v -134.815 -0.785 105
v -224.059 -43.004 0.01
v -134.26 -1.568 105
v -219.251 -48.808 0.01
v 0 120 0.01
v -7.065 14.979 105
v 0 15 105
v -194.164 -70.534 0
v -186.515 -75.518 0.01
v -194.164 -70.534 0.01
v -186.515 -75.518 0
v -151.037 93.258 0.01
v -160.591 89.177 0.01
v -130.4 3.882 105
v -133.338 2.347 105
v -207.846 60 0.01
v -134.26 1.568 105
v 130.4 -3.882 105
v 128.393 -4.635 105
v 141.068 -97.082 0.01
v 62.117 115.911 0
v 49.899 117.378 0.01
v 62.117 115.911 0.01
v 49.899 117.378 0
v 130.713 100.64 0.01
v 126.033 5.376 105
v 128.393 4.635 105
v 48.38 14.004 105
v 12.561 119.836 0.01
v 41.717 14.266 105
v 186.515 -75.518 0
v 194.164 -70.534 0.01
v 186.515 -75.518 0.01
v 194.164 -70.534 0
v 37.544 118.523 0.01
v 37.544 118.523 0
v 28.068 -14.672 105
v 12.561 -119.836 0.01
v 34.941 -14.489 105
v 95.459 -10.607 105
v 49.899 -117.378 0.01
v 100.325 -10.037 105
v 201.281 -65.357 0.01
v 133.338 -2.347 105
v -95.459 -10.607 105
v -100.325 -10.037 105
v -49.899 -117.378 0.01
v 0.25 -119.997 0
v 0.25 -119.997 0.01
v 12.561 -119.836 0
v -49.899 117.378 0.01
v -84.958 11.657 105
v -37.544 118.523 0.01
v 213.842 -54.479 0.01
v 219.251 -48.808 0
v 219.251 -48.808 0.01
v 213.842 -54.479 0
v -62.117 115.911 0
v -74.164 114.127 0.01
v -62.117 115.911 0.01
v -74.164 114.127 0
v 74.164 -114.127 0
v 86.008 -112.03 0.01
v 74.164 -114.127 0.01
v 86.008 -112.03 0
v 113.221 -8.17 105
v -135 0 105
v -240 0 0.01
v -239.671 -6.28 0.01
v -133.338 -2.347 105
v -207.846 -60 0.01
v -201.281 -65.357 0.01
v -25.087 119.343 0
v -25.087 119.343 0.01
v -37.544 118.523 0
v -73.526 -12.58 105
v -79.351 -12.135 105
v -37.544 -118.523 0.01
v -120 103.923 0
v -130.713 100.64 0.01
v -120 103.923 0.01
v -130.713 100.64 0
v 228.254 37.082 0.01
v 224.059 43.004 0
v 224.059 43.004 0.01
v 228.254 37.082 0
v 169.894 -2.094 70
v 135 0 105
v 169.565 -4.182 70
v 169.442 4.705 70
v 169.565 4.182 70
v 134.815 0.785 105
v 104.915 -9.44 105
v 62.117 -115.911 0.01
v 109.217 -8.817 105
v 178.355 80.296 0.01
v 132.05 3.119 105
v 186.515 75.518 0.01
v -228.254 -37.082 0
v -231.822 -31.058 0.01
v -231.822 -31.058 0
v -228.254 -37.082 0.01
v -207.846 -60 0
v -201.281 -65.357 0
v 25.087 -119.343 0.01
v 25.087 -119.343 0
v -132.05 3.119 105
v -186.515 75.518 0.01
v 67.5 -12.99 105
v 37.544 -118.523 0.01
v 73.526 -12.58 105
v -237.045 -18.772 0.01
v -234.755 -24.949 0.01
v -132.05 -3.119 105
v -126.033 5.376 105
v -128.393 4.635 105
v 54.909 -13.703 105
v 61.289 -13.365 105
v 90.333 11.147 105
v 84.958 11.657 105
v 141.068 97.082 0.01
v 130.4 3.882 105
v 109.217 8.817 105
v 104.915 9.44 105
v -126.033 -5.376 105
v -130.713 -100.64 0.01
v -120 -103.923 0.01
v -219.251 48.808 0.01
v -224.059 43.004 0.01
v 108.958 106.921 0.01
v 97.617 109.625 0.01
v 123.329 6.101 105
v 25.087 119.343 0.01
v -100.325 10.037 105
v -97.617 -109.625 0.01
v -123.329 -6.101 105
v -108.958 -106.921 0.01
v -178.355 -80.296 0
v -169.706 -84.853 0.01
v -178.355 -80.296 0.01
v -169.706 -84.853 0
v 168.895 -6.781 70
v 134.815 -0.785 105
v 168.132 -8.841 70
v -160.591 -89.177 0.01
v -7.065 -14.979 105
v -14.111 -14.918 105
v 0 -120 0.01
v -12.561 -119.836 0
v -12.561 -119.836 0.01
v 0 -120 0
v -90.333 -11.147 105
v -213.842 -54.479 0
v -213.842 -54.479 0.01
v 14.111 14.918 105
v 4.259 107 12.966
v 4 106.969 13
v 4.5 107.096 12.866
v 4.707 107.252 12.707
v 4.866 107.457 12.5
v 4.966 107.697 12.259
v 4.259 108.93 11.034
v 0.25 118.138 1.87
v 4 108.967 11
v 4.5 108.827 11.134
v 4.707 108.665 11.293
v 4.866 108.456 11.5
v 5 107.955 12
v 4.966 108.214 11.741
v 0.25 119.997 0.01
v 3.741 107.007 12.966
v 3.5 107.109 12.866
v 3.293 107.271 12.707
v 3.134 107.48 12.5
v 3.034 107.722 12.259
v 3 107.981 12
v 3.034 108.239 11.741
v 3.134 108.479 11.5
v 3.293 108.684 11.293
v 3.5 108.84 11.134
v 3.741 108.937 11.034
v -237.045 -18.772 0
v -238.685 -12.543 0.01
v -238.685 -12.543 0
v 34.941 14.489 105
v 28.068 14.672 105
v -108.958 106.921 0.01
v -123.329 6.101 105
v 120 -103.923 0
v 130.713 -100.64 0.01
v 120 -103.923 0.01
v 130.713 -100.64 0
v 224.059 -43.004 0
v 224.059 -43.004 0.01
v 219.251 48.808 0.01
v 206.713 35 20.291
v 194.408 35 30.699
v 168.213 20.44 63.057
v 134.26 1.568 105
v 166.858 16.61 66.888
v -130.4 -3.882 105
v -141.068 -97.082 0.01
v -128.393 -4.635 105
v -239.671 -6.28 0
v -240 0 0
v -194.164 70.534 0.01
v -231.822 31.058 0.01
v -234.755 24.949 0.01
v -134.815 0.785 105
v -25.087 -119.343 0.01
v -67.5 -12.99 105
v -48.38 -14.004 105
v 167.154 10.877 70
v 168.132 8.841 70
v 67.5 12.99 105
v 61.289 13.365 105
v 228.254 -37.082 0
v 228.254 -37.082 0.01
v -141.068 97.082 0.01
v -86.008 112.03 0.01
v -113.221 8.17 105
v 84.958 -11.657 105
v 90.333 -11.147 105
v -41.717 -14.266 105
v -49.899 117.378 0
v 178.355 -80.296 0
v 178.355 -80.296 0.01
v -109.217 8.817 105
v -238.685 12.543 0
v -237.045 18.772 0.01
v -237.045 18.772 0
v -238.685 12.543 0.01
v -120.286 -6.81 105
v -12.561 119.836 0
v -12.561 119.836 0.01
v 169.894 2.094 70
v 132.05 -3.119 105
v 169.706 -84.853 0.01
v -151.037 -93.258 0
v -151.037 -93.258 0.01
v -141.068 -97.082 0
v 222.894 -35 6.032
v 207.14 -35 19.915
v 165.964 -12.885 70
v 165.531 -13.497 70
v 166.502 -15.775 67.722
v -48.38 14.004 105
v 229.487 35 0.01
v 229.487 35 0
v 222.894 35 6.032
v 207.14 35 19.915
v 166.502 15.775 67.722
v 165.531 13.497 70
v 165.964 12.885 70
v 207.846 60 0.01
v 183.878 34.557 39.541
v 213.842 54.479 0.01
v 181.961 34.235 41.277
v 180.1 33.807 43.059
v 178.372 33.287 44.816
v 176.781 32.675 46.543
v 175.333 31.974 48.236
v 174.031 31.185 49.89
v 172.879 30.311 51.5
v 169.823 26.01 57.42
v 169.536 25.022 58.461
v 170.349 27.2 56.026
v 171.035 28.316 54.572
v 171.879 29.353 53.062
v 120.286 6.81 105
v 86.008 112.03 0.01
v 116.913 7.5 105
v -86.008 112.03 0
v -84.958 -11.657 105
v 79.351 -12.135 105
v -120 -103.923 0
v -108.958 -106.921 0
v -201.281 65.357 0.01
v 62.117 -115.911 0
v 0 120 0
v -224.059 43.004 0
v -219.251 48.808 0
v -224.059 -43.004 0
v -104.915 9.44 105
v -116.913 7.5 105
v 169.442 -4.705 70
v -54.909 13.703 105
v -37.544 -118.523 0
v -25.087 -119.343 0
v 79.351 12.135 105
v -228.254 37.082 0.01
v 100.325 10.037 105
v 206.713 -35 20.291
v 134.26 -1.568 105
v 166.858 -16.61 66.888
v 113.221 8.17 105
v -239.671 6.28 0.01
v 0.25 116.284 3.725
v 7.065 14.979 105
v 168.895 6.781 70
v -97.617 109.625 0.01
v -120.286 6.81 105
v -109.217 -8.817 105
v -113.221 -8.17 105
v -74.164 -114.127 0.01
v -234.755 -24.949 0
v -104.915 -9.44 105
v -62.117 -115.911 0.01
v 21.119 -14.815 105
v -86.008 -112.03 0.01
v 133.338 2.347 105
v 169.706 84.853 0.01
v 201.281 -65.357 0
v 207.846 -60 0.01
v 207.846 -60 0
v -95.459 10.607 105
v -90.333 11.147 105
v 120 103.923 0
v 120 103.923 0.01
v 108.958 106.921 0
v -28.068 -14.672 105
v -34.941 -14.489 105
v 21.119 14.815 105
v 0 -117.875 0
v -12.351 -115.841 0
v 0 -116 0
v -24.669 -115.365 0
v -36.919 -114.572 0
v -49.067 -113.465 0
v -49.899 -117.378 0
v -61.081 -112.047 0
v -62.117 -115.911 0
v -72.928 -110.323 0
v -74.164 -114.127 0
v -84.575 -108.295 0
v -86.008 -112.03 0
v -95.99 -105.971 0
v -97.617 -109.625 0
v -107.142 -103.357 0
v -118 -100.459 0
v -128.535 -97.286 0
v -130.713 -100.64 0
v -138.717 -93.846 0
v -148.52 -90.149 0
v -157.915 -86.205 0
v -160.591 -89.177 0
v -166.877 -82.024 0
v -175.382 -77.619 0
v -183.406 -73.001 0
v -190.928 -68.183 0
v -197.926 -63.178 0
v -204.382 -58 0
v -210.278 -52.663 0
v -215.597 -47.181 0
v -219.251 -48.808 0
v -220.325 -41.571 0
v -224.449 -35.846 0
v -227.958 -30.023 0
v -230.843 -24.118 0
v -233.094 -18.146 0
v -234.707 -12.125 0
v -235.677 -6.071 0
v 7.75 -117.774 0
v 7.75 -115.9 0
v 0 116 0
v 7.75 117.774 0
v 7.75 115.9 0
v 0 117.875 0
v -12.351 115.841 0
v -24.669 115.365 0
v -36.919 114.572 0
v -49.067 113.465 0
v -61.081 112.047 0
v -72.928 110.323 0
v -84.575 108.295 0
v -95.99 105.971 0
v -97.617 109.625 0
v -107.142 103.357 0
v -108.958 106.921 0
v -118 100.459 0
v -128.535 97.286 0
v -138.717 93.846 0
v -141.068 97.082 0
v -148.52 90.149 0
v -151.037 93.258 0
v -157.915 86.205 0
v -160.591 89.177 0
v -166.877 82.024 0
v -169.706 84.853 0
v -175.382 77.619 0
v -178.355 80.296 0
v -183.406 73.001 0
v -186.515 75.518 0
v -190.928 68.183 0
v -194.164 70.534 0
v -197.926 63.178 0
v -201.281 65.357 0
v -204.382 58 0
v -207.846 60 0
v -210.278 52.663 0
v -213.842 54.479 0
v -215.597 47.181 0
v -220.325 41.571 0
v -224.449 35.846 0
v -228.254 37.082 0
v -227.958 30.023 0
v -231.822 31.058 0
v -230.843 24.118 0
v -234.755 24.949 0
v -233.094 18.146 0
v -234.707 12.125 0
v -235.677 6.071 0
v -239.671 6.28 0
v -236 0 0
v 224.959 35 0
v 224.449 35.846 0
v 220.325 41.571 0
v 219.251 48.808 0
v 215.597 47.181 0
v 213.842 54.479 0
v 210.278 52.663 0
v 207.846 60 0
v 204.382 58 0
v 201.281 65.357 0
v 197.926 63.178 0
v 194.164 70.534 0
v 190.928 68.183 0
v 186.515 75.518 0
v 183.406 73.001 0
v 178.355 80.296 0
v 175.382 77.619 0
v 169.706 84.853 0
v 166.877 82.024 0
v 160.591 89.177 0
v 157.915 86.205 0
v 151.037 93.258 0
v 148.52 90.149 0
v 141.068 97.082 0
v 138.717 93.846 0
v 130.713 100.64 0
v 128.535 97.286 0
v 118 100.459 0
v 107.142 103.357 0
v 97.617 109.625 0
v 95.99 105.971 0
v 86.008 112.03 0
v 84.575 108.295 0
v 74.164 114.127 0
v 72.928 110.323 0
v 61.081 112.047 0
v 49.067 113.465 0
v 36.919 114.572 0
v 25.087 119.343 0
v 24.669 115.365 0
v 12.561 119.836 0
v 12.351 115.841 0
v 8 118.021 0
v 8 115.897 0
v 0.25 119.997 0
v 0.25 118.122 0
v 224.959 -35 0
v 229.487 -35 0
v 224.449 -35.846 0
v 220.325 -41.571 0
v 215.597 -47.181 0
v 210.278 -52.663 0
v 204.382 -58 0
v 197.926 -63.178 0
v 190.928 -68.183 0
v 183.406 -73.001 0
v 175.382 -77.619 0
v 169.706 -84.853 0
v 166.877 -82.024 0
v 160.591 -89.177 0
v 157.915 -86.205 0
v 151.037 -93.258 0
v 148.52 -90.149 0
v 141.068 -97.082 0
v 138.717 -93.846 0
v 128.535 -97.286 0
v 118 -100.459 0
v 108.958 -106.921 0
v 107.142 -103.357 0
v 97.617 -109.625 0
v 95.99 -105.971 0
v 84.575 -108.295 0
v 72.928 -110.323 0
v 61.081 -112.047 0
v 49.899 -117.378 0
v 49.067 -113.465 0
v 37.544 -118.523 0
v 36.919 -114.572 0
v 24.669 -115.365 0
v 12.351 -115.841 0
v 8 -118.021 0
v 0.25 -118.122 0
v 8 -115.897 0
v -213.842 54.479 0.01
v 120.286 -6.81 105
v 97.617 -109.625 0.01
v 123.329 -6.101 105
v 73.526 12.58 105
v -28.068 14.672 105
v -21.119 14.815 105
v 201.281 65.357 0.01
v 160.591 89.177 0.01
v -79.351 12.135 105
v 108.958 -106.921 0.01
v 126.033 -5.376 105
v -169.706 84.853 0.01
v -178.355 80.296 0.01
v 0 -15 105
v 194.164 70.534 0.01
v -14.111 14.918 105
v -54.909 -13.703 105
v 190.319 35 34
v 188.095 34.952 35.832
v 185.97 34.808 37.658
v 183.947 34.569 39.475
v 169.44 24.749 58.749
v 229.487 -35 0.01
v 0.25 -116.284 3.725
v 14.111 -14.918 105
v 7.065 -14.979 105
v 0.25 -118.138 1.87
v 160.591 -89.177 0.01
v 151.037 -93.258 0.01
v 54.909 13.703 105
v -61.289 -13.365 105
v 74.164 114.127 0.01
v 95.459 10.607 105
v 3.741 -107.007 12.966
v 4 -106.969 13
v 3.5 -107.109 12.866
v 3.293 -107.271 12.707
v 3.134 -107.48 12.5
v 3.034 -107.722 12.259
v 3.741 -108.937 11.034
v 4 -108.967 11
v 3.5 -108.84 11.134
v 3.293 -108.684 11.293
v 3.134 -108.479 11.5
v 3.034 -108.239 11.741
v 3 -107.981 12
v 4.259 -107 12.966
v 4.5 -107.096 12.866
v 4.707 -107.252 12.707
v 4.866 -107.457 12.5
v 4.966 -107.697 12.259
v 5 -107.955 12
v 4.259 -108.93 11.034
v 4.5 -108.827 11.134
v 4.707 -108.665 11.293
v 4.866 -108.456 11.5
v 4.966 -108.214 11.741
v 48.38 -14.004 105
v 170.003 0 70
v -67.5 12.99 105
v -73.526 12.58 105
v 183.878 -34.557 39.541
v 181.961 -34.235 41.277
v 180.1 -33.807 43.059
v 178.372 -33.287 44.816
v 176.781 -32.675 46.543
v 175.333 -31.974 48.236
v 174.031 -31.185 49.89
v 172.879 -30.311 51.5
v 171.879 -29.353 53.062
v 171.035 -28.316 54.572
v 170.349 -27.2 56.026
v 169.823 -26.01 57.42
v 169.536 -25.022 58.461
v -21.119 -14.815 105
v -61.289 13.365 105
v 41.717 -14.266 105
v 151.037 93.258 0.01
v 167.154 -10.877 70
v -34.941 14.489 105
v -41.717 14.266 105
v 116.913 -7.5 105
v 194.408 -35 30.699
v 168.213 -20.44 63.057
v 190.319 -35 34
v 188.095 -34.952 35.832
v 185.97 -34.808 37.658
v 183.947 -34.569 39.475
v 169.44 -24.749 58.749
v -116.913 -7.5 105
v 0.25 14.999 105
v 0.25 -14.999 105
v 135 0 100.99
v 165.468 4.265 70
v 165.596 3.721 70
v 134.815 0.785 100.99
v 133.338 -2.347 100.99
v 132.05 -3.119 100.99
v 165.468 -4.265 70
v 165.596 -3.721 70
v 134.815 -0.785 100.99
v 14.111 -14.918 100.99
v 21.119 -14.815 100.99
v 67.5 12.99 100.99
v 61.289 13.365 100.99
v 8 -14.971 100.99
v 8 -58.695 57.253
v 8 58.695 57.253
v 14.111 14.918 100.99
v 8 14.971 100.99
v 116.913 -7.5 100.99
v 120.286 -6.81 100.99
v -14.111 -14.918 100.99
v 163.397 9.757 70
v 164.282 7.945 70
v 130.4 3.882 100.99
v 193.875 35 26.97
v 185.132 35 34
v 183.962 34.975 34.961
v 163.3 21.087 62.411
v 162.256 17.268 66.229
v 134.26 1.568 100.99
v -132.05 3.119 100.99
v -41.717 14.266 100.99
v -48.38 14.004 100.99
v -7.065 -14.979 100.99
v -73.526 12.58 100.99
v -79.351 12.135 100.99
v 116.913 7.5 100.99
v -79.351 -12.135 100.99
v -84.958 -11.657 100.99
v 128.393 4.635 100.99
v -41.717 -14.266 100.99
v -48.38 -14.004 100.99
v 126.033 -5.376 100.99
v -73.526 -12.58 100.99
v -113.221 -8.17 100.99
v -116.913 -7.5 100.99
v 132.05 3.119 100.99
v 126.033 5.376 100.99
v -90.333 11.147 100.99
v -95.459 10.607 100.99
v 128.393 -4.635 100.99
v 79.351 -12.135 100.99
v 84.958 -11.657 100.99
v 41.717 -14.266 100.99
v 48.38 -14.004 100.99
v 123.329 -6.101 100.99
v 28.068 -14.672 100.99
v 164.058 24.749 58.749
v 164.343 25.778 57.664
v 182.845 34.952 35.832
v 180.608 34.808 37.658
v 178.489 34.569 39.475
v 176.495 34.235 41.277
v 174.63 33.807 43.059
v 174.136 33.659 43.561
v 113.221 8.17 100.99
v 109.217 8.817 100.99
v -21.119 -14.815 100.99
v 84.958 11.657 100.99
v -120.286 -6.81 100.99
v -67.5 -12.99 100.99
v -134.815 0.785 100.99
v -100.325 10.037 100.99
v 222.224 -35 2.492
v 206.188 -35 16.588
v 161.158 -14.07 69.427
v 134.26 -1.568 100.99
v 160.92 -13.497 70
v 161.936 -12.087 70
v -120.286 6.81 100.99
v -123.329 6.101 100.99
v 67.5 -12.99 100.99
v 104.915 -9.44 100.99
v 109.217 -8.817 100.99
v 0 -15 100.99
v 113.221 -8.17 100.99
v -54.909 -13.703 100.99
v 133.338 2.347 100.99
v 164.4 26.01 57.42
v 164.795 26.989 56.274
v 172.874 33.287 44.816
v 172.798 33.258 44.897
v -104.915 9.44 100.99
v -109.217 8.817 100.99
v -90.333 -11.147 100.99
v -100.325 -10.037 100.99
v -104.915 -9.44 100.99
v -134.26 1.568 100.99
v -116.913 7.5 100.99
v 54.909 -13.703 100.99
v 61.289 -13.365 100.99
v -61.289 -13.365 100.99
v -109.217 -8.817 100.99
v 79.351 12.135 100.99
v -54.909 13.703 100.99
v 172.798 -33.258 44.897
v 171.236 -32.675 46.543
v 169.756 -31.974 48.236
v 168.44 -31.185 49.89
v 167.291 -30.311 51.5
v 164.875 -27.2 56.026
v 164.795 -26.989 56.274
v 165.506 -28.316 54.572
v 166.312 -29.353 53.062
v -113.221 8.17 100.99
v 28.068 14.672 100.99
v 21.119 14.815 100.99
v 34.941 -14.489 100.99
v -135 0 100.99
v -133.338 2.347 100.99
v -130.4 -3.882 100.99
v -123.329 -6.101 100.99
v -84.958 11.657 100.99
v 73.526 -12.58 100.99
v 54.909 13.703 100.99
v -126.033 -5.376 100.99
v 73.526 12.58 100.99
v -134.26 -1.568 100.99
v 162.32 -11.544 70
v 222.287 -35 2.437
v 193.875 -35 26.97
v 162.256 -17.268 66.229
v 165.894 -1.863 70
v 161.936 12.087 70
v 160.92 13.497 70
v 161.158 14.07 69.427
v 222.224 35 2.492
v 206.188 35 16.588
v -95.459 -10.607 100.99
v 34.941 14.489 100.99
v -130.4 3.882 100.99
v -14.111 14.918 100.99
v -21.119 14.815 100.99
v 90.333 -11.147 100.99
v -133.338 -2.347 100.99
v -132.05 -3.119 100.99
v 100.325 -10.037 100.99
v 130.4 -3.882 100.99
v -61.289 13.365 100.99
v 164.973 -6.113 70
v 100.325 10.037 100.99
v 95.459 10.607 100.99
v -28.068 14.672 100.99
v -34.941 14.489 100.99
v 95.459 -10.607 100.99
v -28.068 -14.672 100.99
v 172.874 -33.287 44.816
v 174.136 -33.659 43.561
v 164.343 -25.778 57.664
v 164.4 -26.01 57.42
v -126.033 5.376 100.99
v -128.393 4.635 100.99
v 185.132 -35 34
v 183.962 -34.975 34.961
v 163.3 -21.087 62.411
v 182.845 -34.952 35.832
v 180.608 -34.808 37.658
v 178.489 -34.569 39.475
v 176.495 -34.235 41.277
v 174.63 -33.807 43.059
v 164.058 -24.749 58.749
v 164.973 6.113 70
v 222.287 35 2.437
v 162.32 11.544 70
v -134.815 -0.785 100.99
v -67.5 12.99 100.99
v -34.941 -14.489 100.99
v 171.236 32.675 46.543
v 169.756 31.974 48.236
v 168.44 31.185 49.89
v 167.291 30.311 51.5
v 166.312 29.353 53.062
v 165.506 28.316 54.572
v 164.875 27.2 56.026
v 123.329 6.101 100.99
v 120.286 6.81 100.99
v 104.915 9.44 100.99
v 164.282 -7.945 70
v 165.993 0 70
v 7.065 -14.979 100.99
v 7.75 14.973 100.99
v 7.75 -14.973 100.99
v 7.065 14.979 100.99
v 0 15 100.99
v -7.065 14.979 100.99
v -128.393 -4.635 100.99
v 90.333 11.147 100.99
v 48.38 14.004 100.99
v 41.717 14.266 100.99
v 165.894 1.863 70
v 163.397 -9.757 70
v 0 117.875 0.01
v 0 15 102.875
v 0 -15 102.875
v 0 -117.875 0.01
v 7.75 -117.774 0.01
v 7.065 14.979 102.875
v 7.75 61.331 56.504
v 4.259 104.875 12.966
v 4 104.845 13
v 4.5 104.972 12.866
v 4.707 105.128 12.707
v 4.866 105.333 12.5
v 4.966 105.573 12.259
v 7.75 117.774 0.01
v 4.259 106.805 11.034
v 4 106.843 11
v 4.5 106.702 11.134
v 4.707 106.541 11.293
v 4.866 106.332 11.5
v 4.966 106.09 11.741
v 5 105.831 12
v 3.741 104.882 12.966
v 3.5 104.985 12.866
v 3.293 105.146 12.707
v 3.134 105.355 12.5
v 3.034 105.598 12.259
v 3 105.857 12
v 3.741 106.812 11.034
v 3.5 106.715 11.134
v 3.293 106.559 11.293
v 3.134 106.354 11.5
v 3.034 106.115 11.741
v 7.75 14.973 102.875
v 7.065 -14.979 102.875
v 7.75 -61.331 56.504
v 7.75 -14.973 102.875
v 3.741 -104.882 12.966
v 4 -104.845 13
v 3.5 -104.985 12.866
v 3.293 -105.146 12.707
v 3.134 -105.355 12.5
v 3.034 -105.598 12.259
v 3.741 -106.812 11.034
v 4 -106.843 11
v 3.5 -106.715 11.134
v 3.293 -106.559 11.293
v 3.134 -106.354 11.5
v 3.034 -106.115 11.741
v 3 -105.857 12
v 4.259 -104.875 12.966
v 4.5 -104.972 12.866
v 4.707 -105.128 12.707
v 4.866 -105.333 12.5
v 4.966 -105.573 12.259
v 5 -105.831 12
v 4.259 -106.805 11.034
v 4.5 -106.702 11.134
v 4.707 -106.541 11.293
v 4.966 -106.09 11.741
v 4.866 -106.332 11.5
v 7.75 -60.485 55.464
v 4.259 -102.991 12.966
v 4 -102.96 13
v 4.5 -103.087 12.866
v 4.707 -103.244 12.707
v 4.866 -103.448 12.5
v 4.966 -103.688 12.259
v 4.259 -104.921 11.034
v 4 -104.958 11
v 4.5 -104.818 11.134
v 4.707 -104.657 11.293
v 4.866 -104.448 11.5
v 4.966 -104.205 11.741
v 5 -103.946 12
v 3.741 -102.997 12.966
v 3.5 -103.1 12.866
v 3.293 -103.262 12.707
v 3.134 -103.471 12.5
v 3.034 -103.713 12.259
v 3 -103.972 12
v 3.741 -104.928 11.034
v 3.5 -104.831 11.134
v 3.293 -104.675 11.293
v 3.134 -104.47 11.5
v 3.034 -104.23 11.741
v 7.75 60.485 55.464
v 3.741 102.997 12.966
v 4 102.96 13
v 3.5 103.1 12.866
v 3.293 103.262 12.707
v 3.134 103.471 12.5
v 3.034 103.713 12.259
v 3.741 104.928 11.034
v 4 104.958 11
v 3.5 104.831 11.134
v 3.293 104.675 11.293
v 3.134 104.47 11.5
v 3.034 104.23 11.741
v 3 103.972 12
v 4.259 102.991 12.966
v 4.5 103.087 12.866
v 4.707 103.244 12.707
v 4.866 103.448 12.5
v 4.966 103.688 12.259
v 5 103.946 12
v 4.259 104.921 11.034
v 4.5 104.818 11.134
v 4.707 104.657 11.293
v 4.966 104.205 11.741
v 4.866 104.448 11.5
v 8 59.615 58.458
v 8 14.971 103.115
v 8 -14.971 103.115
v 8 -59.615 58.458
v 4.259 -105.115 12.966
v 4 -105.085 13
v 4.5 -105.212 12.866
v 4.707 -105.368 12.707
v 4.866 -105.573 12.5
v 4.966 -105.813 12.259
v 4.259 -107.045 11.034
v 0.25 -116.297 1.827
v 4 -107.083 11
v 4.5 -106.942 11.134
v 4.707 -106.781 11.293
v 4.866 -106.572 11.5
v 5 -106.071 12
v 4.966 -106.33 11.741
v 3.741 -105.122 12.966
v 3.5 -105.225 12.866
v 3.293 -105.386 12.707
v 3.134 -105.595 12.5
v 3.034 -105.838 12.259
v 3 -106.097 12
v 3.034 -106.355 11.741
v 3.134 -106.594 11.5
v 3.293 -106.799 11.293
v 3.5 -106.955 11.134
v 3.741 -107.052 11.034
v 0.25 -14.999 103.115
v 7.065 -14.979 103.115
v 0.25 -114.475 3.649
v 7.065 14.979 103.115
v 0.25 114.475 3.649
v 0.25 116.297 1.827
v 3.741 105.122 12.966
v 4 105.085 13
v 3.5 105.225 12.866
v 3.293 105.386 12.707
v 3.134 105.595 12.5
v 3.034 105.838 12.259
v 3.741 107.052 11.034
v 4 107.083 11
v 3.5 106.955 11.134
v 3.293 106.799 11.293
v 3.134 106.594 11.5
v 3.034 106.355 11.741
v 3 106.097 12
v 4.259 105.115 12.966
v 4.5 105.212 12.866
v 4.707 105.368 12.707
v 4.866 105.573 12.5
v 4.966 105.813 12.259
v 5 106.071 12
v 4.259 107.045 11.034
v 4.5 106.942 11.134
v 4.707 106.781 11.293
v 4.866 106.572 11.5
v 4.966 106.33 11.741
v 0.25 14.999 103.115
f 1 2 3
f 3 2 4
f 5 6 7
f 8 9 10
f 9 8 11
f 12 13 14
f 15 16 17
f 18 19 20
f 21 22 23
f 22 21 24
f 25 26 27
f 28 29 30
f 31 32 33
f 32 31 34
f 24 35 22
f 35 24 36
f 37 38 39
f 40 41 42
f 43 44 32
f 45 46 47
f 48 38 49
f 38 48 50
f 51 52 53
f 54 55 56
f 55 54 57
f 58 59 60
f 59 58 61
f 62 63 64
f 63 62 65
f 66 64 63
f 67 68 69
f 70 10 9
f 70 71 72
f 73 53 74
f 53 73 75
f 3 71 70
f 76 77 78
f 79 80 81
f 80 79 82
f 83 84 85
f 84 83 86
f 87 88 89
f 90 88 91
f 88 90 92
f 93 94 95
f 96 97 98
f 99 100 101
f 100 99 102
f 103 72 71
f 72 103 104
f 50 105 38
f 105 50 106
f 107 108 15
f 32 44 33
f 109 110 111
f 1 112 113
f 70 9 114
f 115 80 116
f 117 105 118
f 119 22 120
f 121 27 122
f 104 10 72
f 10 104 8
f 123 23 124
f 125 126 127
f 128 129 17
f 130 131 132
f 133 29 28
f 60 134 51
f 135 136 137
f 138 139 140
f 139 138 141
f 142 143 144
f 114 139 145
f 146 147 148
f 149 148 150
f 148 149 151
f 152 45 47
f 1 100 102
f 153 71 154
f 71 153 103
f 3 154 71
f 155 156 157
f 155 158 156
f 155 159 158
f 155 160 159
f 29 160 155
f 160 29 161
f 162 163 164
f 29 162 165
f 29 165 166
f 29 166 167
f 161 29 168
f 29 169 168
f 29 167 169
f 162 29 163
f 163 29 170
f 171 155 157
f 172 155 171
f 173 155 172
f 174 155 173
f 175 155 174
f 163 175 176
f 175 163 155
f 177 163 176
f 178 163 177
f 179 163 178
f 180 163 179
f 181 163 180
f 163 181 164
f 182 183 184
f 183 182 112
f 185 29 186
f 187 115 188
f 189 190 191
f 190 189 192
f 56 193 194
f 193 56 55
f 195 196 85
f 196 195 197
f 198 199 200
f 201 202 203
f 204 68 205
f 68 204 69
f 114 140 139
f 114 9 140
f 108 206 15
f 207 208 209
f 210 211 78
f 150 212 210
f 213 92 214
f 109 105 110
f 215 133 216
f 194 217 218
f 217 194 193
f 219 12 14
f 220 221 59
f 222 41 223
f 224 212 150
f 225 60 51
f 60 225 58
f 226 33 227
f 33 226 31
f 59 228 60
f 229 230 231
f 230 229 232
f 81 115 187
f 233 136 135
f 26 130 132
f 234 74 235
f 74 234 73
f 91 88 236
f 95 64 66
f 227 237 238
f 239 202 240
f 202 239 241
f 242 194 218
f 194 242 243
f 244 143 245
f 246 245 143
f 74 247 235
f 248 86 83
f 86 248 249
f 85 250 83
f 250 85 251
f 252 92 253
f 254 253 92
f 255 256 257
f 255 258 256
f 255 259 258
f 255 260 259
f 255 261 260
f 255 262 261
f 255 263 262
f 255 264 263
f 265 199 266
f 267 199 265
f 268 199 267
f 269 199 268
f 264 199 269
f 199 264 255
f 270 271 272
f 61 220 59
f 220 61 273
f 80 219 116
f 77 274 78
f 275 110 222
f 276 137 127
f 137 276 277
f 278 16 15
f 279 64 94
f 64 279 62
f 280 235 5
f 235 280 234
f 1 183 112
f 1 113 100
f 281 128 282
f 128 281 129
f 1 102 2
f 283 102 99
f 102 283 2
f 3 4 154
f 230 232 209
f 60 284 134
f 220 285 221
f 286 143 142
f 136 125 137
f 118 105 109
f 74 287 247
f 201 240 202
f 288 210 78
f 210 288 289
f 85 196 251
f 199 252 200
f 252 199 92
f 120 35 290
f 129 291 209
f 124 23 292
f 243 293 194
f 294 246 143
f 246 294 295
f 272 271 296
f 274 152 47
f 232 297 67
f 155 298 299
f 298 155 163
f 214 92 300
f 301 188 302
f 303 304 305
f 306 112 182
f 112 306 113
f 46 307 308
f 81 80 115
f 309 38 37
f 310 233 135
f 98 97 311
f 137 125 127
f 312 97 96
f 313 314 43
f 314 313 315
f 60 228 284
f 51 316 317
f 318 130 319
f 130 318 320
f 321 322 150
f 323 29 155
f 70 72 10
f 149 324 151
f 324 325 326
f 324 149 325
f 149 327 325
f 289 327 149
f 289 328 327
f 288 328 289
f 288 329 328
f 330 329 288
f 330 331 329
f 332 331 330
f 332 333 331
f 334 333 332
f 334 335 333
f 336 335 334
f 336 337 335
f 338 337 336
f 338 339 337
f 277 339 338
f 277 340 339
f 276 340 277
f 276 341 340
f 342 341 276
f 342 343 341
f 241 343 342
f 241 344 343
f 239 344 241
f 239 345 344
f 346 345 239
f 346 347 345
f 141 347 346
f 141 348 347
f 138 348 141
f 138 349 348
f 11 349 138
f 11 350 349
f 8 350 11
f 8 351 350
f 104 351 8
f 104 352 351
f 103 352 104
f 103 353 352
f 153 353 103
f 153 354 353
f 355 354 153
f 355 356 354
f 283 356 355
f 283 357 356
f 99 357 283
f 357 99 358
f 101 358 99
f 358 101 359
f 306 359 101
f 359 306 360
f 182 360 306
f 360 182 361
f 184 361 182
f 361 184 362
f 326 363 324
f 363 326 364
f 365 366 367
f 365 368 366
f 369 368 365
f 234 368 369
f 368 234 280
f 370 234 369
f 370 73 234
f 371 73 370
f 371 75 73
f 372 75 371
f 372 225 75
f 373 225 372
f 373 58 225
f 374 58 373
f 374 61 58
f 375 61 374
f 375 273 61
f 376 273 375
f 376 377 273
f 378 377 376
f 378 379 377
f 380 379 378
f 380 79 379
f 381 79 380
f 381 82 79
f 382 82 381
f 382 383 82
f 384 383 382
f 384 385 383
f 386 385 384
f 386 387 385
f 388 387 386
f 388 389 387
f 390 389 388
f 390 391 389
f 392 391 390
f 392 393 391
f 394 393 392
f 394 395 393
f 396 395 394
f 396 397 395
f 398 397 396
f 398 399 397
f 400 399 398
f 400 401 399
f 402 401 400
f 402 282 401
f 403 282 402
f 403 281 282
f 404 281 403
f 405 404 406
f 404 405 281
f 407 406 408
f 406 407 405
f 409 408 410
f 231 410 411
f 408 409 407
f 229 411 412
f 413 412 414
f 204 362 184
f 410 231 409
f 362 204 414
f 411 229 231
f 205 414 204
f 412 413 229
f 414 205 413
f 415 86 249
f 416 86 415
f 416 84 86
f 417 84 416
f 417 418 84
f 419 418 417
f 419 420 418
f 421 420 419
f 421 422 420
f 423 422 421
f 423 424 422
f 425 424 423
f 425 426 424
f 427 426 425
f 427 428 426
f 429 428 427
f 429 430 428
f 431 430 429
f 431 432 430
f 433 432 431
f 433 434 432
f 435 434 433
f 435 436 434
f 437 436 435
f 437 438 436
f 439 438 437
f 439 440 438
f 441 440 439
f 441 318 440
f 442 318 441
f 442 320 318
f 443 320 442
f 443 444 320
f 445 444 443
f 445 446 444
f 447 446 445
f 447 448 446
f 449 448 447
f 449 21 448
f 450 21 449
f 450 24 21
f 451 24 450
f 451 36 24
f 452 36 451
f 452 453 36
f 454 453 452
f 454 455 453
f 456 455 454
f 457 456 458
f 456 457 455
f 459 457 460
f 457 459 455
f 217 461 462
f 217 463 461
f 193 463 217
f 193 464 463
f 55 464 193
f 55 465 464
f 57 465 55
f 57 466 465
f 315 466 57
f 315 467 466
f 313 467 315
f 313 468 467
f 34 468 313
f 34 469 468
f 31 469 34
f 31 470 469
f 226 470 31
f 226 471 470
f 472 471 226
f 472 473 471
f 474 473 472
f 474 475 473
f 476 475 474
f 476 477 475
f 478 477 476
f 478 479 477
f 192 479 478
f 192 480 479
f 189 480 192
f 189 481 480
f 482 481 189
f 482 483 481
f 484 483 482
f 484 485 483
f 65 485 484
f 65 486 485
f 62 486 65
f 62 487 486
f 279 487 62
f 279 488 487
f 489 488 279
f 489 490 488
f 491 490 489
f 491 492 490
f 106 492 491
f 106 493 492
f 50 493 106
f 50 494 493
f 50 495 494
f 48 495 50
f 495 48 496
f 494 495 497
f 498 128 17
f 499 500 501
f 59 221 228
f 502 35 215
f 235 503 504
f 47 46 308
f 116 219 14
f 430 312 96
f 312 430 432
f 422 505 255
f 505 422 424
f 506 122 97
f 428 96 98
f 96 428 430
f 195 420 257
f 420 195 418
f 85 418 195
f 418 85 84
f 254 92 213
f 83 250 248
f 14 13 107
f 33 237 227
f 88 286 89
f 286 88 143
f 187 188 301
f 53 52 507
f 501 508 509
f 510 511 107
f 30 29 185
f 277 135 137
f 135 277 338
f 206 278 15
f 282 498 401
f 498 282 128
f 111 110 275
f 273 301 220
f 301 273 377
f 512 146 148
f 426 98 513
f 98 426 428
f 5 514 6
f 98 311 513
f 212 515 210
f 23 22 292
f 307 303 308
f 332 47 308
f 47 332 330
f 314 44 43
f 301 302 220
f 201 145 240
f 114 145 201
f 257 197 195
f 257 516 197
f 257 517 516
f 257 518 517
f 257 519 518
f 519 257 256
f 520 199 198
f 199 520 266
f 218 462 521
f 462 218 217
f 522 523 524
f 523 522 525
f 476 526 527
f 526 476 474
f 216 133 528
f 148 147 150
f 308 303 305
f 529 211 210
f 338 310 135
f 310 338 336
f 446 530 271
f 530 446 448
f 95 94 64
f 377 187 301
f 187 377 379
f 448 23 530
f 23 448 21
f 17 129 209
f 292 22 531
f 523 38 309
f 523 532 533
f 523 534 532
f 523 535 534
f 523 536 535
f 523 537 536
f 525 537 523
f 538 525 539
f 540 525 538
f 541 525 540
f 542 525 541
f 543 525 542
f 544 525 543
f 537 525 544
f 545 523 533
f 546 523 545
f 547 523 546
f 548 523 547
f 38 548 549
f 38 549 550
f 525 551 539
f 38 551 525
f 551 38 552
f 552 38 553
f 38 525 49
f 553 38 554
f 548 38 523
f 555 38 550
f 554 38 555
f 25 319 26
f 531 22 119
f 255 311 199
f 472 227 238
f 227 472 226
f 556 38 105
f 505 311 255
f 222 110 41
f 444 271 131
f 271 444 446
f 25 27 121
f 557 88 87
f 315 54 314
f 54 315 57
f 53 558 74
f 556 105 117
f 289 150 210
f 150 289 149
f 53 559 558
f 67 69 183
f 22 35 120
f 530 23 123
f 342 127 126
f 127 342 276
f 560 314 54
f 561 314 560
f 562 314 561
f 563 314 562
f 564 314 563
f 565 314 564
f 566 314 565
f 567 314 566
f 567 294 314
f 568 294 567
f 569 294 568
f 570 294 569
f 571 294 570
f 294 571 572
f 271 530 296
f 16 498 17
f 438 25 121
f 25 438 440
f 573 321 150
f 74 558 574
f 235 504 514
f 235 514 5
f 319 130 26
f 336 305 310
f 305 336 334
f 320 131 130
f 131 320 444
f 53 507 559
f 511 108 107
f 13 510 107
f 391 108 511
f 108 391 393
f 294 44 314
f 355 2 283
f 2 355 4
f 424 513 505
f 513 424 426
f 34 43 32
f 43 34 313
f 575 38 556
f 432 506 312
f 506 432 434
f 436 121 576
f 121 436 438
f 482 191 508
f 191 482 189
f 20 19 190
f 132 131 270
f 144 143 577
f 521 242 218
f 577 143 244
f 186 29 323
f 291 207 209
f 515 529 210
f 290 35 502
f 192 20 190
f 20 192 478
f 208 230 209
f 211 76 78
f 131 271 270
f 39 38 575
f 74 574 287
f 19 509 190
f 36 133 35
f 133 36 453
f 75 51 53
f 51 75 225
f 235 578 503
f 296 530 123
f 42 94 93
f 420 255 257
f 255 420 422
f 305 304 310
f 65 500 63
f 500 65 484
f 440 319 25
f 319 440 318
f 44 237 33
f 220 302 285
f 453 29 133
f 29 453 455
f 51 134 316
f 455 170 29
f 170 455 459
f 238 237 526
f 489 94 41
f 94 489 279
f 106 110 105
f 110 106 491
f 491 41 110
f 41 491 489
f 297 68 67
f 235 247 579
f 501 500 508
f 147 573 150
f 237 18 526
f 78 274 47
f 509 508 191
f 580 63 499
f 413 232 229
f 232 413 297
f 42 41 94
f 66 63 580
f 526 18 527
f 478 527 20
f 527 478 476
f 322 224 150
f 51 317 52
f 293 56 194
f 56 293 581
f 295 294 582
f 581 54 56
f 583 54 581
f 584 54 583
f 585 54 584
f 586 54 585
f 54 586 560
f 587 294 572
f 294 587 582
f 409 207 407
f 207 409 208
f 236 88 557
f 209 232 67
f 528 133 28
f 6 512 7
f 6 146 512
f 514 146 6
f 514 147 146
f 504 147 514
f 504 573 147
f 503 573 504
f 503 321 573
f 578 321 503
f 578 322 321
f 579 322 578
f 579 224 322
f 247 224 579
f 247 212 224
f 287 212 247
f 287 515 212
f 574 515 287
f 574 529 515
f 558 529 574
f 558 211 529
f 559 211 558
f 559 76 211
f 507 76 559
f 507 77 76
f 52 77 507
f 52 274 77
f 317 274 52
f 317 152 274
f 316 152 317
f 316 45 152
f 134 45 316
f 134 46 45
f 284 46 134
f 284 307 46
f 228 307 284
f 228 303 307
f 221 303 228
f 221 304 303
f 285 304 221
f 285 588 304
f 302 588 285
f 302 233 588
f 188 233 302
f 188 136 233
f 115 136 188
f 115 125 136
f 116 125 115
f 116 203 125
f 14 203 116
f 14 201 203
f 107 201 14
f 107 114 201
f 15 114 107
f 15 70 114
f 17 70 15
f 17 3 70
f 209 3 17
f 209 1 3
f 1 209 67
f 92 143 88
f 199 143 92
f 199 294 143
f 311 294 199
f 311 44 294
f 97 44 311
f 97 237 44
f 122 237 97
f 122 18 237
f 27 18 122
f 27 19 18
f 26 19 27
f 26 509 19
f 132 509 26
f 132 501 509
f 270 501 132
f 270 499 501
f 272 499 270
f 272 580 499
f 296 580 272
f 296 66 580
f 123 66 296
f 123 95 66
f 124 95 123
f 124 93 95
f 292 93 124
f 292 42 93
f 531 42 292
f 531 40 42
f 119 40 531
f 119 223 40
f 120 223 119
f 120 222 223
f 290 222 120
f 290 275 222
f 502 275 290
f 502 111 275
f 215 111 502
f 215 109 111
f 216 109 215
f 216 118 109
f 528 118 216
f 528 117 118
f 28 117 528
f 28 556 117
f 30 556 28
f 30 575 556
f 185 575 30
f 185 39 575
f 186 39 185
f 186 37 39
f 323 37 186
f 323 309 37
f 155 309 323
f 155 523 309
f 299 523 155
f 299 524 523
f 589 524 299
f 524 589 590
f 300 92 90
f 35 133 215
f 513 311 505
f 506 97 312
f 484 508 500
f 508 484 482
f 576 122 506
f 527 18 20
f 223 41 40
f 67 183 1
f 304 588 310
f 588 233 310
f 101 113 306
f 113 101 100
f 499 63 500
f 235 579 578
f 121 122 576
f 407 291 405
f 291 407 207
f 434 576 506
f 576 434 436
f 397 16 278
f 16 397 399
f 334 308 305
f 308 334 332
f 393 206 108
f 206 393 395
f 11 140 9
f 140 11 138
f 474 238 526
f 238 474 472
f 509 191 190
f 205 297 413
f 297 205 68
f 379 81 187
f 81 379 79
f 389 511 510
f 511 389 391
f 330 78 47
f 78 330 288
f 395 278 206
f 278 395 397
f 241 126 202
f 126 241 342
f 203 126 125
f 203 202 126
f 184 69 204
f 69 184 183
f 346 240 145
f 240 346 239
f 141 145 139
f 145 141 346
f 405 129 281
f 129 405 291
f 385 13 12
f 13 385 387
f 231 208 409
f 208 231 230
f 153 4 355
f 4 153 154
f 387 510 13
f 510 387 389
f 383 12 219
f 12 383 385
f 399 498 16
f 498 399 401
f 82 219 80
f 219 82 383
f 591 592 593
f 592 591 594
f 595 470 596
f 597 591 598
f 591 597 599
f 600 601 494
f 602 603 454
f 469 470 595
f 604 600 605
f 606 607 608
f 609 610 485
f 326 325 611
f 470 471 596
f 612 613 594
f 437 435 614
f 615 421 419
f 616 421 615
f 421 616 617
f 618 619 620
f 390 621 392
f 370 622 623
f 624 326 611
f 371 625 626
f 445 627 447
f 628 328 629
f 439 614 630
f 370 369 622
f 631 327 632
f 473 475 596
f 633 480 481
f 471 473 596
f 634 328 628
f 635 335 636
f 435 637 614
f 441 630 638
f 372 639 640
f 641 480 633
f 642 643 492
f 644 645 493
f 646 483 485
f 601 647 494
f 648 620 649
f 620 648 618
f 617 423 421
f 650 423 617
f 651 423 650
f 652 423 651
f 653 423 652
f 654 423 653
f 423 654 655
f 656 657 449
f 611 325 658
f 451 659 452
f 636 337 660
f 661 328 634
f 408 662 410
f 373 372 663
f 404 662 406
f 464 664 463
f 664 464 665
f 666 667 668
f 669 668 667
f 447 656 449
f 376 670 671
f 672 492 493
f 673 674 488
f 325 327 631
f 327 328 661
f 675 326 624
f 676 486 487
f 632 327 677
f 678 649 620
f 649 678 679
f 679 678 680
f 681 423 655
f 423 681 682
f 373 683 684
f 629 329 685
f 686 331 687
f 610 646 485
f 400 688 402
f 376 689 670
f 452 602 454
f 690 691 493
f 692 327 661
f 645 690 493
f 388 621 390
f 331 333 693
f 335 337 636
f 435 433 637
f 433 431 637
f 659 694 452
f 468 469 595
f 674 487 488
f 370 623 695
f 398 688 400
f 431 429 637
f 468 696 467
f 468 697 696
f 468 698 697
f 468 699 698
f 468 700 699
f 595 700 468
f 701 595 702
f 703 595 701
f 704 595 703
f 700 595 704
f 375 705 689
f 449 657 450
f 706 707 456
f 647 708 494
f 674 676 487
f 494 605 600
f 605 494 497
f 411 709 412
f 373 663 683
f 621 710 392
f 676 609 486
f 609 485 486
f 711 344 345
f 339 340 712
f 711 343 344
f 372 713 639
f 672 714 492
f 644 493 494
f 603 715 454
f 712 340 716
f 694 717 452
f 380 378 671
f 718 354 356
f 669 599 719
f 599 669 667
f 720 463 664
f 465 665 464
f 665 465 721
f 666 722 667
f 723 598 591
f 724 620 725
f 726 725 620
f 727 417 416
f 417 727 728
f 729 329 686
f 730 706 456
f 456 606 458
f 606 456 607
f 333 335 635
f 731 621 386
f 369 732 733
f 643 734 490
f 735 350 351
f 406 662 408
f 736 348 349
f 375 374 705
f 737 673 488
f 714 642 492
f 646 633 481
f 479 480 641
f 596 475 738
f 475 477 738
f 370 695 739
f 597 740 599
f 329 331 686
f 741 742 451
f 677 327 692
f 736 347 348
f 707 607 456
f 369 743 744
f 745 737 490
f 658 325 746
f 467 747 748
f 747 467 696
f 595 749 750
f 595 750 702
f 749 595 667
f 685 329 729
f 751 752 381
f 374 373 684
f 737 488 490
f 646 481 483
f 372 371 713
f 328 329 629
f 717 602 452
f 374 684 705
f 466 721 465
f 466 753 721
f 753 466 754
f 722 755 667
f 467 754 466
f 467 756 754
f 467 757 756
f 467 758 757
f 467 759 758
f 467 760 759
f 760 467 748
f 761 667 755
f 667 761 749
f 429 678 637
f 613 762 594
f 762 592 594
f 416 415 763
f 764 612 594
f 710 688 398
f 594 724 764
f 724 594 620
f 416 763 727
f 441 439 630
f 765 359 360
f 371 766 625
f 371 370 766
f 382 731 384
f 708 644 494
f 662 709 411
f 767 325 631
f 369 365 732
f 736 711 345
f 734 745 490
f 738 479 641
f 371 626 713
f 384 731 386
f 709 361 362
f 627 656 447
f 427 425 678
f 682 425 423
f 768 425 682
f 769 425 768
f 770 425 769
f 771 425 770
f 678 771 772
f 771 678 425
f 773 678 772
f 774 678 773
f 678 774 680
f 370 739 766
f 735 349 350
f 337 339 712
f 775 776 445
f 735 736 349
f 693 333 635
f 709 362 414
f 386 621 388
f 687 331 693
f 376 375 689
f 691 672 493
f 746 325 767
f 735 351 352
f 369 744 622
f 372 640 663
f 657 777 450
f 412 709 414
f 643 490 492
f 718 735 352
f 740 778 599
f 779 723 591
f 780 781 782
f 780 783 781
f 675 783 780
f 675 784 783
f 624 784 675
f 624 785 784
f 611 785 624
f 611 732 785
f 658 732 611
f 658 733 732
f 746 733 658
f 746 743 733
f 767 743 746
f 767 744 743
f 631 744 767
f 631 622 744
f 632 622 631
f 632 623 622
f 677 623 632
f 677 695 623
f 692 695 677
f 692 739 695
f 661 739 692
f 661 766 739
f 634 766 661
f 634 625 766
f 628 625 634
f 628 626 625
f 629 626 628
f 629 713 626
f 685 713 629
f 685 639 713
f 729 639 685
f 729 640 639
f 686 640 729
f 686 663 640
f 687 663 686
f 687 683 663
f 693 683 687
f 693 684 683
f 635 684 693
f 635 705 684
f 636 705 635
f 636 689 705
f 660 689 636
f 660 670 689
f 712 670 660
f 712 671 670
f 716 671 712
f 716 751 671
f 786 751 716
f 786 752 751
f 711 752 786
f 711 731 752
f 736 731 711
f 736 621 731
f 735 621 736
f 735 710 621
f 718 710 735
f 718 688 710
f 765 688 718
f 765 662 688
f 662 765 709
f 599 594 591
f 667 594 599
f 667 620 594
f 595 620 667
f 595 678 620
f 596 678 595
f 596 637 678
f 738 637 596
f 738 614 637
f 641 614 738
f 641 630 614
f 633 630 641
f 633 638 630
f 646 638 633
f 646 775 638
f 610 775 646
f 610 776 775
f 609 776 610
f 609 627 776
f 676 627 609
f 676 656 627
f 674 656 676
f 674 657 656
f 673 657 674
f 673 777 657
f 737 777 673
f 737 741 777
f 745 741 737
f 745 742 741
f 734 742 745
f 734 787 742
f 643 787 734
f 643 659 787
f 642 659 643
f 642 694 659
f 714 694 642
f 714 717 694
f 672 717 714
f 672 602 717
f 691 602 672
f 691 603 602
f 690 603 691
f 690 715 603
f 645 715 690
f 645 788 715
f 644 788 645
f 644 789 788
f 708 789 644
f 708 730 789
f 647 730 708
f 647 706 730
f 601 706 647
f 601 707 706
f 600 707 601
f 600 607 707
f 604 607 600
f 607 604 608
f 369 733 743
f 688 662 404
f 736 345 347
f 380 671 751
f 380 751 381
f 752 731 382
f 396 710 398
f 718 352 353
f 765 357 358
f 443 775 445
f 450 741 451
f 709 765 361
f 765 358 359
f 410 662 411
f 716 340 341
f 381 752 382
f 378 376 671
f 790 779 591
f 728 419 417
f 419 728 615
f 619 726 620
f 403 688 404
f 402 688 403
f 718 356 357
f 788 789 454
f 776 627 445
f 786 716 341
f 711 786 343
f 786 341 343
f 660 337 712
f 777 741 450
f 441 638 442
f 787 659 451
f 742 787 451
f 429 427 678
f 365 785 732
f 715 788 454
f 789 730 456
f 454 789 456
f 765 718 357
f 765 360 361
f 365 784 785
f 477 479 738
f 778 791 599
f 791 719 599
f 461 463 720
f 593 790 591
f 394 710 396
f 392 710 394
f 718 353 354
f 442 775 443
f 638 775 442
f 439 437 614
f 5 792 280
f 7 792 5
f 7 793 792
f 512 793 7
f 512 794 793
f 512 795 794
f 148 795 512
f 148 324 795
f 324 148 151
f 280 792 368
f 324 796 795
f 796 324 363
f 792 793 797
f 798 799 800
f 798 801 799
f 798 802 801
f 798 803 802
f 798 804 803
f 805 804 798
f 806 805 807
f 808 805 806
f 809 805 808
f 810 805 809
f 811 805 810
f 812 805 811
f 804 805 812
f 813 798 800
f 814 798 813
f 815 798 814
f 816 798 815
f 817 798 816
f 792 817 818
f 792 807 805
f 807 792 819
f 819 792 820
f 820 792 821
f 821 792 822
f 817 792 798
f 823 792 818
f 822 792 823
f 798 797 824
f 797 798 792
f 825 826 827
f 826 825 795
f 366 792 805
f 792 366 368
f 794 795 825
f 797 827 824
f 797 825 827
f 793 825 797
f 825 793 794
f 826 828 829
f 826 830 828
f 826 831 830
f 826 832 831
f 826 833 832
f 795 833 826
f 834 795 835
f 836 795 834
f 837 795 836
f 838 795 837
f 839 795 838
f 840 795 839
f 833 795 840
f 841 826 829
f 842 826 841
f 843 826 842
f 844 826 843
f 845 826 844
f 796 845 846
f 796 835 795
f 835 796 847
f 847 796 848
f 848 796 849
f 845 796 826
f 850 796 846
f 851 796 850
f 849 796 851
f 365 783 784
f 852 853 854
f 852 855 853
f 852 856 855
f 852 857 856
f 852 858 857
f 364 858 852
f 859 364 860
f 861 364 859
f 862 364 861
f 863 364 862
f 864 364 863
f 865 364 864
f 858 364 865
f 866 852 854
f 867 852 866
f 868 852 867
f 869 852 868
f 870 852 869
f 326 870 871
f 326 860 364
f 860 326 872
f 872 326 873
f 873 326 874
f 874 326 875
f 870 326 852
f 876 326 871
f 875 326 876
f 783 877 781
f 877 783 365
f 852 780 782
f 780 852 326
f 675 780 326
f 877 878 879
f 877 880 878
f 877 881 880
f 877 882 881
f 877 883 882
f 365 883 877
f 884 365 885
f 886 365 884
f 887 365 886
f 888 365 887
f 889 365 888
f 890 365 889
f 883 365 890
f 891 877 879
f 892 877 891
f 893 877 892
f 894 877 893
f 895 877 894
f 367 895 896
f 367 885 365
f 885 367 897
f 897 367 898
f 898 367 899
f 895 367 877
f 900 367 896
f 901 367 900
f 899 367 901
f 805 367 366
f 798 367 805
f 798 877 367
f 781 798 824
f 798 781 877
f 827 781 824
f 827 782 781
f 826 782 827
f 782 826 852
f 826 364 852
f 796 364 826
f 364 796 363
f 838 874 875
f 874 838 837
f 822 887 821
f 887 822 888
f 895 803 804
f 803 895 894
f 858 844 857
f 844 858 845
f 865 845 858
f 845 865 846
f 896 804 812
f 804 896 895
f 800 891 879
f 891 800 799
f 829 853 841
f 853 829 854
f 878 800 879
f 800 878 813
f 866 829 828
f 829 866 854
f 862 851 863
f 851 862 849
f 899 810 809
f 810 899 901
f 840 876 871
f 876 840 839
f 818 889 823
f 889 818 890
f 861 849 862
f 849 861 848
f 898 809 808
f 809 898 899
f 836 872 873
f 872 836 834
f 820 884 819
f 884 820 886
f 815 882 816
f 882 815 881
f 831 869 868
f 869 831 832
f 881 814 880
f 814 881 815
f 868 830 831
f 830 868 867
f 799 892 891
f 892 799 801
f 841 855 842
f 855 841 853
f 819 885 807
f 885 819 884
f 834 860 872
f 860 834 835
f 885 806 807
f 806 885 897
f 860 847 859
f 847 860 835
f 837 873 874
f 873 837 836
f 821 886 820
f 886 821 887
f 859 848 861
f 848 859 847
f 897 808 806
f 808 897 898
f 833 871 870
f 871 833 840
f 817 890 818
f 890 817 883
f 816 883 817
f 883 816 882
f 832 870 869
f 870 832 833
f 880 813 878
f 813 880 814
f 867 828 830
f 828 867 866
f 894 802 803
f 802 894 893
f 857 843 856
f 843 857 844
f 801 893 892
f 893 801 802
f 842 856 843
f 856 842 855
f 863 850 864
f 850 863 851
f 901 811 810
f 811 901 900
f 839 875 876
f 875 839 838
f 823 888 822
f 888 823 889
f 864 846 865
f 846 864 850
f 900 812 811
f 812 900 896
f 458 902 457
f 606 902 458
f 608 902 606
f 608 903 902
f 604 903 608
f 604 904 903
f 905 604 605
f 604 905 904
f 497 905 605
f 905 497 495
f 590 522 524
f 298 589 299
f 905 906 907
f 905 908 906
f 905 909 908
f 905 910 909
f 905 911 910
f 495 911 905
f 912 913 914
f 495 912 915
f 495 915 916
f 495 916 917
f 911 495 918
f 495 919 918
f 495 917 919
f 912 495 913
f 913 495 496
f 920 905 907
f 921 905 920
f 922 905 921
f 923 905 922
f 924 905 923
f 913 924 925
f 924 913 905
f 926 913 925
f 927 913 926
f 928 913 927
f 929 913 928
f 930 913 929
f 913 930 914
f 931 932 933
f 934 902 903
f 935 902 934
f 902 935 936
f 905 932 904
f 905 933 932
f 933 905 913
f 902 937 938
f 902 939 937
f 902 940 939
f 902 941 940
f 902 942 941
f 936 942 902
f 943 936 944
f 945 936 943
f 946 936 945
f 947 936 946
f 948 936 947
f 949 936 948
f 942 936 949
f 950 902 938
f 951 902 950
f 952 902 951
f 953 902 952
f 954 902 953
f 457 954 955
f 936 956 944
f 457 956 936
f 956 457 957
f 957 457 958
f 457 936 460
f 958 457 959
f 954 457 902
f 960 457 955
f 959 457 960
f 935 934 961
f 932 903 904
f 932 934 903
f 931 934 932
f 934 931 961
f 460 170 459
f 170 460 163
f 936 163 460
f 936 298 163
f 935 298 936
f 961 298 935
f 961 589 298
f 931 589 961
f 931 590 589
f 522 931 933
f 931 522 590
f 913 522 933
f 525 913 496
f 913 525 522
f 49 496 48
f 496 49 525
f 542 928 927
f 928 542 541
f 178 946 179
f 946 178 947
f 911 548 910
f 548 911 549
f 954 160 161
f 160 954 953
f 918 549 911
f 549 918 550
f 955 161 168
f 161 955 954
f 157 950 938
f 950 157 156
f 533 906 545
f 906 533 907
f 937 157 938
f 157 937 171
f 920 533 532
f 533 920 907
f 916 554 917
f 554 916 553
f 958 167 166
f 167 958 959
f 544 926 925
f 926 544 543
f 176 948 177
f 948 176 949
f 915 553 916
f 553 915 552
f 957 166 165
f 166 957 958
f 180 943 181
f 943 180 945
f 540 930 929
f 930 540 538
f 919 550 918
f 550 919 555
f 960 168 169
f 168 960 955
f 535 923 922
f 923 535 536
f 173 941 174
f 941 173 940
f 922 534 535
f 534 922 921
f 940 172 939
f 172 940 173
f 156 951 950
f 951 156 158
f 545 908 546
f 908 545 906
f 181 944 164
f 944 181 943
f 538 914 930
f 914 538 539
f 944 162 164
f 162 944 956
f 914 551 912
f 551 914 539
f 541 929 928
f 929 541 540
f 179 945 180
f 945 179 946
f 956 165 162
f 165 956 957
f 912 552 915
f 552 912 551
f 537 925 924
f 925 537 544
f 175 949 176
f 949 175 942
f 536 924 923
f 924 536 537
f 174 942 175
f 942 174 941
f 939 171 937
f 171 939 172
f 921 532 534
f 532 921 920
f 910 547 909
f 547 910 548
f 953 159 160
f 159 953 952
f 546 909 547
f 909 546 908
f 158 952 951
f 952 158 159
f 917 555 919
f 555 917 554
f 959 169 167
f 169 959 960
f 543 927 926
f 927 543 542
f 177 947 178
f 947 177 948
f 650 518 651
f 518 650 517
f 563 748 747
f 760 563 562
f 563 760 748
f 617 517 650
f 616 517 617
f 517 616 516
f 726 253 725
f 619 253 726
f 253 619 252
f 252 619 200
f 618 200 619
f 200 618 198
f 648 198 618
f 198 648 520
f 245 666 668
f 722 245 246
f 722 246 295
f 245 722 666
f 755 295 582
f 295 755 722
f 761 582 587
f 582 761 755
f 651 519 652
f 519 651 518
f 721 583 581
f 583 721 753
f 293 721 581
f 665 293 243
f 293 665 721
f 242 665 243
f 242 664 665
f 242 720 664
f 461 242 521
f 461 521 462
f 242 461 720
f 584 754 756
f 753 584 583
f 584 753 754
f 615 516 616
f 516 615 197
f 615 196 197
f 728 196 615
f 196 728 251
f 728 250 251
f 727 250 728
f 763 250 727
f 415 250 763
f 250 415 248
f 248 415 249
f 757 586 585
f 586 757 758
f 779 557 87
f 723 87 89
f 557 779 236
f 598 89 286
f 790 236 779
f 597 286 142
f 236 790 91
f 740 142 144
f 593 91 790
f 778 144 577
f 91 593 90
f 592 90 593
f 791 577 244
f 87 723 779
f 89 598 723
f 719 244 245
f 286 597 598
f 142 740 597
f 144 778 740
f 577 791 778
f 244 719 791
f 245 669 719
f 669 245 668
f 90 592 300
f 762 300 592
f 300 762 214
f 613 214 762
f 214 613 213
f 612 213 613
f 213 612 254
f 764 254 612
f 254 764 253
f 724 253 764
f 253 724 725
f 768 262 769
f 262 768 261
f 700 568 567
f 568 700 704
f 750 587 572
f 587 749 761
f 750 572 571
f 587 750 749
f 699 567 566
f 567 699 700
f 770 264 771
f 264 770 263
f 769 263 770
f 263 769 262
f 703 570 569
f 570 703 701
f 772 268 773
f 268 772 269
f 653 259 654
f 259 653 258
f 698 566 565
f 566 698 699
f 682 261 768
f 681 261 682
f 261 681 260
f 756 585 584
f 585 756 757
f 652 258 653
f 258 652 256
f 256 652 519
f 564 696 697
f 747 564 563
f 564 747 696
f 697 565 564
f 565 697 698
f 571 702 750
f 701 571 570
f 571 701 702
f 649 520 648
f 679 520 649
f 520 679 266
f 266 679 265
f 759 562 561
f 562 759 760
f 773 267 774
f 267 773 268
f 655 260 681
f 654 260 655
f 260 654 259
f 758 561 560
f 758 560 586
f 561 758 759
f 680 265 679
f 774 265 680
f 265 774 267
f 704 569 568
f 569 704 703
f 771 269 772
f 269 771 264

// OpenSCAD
// Oval snake hide, printed as two halves on a Bambu A1 (256 x 256 bed).
// No supports: every wall is <= 45 degrees, the roof is a short bridge,
// and the entrance is an arch with a flat-bridged top.
//
// Set `part` to "A" or "B" and export each half to STL.
// Pin the halves together with two short pieces of 1.75 mm filament.

part = "both"; // "A", "B", or "both" (assembled preview)

length = 480;          // outer length of the oval (x)
width = 240;           // outer width of the oval (y)
roof_width = 30;       // flat roof strip across the top (bridged)
wall = 4;              // horizontal wall thickness (~2.8 mm normal to the 45 deg slope)

entrance_width = 70;
entrance_height = 70;

lap = 8;               // how far the two halves overlap at the seam
clearance = 0.25;      // gap between mating lap surfaces
pin_d = 2.0;           // hole for 1.75 mm filament pin
pin_z = 12;

$fn = 120;

a = length / 2;
b = width / 2;
height = b - roof_width / 2;   // 45 deg slope from the base edge up to the roof strip

module oval(rx, ry) {
    scale([rx, ry]) circle(1);
}

// Solid dome shrunk inward by `inset`. Each horizontal slice loses the same
// amount from both semi-axes per unit of height, which keeps every surface
// at 45 degrees or steeper.
module dome(inset) {
    hull() {
        linear_extrude(0.01) oval(a - inset, b - inset);
        translate([0, 0, height - inset - 0.01])
            linear_extrude(0.01) oval(a - height, b - height);
    }
}

module shell() {
    difference() {
        dome(0);
        translate([0, 0, -0.01]) dome(wall);
    }
}

// Inner half of the wall: the lip on A that slides under B's outer half.
module inner_lip() {
    difference() {
        dome(wall / 2 + clearance / 2);
        translate([0, 0, -0.01]) dome(wall);
    }
}

// Outer half of the wall: the lip on B that covers A's inner lip.
module outer_lip() {
    difference() {
        dome(0);
        translate([0, 0, -0.01]) dome(wall / 2 - clearance / 2);
    }
}

module slab(x0, x1) {
    translate([x0, -b - 1, -1]) cube([x1 - x0, width + 2, height + 2]);
}

module teardrop(r) {
    hull() {
        circle(r);
        rotate(45) square(r);
    }
}

// Arched doorway: straight sides up to the widest point, a round top, and
// the very top trimmed flat where it would overhang more than 45 degrees
// (a short bridge instead of supports).
module entrance() {
    r = entrance_width / 2;
    translate([a / 2, 0, 0])
    rotate([90, 0, 90])
    linear_extrude(a / 2 + 1)
    intersection() {
        union() {
            translate([0, r - 1]) teardrop(r);
            translate([-r, -1]) square([entrance_width, r]);
        }
        translate([-r, -1]) square([entrance_width, entrance_height + 1]);
    }
}

module pin_holes() {
    translate([lap / 2, 0, pin_z])
        rotate([90, 0, 0]) cylinder(d = pin_d, h = width + 2, center = true, $fn = 24);
}

module half_a() {
    difference() {
        union() {
            intersection() { shell(); slab(-a - 1, 0); }
            intersection() { inner_lip(); slab(0, lap - clearance); }
        }
        pin_holes();
    }
}

module half_b() {
    difference() {
        union() {
            intersection() { shell(); slab(lap, a + 1); }
            intersection() { outer_lip(); slab(clearance, lap); }
        }
        pin_holes();
        entrance();
    }
}

if (part == "A") half_a();
else if (part == "B") half_b();
else {
    color("tan") half_a();
    color("peru") half_b();
}
